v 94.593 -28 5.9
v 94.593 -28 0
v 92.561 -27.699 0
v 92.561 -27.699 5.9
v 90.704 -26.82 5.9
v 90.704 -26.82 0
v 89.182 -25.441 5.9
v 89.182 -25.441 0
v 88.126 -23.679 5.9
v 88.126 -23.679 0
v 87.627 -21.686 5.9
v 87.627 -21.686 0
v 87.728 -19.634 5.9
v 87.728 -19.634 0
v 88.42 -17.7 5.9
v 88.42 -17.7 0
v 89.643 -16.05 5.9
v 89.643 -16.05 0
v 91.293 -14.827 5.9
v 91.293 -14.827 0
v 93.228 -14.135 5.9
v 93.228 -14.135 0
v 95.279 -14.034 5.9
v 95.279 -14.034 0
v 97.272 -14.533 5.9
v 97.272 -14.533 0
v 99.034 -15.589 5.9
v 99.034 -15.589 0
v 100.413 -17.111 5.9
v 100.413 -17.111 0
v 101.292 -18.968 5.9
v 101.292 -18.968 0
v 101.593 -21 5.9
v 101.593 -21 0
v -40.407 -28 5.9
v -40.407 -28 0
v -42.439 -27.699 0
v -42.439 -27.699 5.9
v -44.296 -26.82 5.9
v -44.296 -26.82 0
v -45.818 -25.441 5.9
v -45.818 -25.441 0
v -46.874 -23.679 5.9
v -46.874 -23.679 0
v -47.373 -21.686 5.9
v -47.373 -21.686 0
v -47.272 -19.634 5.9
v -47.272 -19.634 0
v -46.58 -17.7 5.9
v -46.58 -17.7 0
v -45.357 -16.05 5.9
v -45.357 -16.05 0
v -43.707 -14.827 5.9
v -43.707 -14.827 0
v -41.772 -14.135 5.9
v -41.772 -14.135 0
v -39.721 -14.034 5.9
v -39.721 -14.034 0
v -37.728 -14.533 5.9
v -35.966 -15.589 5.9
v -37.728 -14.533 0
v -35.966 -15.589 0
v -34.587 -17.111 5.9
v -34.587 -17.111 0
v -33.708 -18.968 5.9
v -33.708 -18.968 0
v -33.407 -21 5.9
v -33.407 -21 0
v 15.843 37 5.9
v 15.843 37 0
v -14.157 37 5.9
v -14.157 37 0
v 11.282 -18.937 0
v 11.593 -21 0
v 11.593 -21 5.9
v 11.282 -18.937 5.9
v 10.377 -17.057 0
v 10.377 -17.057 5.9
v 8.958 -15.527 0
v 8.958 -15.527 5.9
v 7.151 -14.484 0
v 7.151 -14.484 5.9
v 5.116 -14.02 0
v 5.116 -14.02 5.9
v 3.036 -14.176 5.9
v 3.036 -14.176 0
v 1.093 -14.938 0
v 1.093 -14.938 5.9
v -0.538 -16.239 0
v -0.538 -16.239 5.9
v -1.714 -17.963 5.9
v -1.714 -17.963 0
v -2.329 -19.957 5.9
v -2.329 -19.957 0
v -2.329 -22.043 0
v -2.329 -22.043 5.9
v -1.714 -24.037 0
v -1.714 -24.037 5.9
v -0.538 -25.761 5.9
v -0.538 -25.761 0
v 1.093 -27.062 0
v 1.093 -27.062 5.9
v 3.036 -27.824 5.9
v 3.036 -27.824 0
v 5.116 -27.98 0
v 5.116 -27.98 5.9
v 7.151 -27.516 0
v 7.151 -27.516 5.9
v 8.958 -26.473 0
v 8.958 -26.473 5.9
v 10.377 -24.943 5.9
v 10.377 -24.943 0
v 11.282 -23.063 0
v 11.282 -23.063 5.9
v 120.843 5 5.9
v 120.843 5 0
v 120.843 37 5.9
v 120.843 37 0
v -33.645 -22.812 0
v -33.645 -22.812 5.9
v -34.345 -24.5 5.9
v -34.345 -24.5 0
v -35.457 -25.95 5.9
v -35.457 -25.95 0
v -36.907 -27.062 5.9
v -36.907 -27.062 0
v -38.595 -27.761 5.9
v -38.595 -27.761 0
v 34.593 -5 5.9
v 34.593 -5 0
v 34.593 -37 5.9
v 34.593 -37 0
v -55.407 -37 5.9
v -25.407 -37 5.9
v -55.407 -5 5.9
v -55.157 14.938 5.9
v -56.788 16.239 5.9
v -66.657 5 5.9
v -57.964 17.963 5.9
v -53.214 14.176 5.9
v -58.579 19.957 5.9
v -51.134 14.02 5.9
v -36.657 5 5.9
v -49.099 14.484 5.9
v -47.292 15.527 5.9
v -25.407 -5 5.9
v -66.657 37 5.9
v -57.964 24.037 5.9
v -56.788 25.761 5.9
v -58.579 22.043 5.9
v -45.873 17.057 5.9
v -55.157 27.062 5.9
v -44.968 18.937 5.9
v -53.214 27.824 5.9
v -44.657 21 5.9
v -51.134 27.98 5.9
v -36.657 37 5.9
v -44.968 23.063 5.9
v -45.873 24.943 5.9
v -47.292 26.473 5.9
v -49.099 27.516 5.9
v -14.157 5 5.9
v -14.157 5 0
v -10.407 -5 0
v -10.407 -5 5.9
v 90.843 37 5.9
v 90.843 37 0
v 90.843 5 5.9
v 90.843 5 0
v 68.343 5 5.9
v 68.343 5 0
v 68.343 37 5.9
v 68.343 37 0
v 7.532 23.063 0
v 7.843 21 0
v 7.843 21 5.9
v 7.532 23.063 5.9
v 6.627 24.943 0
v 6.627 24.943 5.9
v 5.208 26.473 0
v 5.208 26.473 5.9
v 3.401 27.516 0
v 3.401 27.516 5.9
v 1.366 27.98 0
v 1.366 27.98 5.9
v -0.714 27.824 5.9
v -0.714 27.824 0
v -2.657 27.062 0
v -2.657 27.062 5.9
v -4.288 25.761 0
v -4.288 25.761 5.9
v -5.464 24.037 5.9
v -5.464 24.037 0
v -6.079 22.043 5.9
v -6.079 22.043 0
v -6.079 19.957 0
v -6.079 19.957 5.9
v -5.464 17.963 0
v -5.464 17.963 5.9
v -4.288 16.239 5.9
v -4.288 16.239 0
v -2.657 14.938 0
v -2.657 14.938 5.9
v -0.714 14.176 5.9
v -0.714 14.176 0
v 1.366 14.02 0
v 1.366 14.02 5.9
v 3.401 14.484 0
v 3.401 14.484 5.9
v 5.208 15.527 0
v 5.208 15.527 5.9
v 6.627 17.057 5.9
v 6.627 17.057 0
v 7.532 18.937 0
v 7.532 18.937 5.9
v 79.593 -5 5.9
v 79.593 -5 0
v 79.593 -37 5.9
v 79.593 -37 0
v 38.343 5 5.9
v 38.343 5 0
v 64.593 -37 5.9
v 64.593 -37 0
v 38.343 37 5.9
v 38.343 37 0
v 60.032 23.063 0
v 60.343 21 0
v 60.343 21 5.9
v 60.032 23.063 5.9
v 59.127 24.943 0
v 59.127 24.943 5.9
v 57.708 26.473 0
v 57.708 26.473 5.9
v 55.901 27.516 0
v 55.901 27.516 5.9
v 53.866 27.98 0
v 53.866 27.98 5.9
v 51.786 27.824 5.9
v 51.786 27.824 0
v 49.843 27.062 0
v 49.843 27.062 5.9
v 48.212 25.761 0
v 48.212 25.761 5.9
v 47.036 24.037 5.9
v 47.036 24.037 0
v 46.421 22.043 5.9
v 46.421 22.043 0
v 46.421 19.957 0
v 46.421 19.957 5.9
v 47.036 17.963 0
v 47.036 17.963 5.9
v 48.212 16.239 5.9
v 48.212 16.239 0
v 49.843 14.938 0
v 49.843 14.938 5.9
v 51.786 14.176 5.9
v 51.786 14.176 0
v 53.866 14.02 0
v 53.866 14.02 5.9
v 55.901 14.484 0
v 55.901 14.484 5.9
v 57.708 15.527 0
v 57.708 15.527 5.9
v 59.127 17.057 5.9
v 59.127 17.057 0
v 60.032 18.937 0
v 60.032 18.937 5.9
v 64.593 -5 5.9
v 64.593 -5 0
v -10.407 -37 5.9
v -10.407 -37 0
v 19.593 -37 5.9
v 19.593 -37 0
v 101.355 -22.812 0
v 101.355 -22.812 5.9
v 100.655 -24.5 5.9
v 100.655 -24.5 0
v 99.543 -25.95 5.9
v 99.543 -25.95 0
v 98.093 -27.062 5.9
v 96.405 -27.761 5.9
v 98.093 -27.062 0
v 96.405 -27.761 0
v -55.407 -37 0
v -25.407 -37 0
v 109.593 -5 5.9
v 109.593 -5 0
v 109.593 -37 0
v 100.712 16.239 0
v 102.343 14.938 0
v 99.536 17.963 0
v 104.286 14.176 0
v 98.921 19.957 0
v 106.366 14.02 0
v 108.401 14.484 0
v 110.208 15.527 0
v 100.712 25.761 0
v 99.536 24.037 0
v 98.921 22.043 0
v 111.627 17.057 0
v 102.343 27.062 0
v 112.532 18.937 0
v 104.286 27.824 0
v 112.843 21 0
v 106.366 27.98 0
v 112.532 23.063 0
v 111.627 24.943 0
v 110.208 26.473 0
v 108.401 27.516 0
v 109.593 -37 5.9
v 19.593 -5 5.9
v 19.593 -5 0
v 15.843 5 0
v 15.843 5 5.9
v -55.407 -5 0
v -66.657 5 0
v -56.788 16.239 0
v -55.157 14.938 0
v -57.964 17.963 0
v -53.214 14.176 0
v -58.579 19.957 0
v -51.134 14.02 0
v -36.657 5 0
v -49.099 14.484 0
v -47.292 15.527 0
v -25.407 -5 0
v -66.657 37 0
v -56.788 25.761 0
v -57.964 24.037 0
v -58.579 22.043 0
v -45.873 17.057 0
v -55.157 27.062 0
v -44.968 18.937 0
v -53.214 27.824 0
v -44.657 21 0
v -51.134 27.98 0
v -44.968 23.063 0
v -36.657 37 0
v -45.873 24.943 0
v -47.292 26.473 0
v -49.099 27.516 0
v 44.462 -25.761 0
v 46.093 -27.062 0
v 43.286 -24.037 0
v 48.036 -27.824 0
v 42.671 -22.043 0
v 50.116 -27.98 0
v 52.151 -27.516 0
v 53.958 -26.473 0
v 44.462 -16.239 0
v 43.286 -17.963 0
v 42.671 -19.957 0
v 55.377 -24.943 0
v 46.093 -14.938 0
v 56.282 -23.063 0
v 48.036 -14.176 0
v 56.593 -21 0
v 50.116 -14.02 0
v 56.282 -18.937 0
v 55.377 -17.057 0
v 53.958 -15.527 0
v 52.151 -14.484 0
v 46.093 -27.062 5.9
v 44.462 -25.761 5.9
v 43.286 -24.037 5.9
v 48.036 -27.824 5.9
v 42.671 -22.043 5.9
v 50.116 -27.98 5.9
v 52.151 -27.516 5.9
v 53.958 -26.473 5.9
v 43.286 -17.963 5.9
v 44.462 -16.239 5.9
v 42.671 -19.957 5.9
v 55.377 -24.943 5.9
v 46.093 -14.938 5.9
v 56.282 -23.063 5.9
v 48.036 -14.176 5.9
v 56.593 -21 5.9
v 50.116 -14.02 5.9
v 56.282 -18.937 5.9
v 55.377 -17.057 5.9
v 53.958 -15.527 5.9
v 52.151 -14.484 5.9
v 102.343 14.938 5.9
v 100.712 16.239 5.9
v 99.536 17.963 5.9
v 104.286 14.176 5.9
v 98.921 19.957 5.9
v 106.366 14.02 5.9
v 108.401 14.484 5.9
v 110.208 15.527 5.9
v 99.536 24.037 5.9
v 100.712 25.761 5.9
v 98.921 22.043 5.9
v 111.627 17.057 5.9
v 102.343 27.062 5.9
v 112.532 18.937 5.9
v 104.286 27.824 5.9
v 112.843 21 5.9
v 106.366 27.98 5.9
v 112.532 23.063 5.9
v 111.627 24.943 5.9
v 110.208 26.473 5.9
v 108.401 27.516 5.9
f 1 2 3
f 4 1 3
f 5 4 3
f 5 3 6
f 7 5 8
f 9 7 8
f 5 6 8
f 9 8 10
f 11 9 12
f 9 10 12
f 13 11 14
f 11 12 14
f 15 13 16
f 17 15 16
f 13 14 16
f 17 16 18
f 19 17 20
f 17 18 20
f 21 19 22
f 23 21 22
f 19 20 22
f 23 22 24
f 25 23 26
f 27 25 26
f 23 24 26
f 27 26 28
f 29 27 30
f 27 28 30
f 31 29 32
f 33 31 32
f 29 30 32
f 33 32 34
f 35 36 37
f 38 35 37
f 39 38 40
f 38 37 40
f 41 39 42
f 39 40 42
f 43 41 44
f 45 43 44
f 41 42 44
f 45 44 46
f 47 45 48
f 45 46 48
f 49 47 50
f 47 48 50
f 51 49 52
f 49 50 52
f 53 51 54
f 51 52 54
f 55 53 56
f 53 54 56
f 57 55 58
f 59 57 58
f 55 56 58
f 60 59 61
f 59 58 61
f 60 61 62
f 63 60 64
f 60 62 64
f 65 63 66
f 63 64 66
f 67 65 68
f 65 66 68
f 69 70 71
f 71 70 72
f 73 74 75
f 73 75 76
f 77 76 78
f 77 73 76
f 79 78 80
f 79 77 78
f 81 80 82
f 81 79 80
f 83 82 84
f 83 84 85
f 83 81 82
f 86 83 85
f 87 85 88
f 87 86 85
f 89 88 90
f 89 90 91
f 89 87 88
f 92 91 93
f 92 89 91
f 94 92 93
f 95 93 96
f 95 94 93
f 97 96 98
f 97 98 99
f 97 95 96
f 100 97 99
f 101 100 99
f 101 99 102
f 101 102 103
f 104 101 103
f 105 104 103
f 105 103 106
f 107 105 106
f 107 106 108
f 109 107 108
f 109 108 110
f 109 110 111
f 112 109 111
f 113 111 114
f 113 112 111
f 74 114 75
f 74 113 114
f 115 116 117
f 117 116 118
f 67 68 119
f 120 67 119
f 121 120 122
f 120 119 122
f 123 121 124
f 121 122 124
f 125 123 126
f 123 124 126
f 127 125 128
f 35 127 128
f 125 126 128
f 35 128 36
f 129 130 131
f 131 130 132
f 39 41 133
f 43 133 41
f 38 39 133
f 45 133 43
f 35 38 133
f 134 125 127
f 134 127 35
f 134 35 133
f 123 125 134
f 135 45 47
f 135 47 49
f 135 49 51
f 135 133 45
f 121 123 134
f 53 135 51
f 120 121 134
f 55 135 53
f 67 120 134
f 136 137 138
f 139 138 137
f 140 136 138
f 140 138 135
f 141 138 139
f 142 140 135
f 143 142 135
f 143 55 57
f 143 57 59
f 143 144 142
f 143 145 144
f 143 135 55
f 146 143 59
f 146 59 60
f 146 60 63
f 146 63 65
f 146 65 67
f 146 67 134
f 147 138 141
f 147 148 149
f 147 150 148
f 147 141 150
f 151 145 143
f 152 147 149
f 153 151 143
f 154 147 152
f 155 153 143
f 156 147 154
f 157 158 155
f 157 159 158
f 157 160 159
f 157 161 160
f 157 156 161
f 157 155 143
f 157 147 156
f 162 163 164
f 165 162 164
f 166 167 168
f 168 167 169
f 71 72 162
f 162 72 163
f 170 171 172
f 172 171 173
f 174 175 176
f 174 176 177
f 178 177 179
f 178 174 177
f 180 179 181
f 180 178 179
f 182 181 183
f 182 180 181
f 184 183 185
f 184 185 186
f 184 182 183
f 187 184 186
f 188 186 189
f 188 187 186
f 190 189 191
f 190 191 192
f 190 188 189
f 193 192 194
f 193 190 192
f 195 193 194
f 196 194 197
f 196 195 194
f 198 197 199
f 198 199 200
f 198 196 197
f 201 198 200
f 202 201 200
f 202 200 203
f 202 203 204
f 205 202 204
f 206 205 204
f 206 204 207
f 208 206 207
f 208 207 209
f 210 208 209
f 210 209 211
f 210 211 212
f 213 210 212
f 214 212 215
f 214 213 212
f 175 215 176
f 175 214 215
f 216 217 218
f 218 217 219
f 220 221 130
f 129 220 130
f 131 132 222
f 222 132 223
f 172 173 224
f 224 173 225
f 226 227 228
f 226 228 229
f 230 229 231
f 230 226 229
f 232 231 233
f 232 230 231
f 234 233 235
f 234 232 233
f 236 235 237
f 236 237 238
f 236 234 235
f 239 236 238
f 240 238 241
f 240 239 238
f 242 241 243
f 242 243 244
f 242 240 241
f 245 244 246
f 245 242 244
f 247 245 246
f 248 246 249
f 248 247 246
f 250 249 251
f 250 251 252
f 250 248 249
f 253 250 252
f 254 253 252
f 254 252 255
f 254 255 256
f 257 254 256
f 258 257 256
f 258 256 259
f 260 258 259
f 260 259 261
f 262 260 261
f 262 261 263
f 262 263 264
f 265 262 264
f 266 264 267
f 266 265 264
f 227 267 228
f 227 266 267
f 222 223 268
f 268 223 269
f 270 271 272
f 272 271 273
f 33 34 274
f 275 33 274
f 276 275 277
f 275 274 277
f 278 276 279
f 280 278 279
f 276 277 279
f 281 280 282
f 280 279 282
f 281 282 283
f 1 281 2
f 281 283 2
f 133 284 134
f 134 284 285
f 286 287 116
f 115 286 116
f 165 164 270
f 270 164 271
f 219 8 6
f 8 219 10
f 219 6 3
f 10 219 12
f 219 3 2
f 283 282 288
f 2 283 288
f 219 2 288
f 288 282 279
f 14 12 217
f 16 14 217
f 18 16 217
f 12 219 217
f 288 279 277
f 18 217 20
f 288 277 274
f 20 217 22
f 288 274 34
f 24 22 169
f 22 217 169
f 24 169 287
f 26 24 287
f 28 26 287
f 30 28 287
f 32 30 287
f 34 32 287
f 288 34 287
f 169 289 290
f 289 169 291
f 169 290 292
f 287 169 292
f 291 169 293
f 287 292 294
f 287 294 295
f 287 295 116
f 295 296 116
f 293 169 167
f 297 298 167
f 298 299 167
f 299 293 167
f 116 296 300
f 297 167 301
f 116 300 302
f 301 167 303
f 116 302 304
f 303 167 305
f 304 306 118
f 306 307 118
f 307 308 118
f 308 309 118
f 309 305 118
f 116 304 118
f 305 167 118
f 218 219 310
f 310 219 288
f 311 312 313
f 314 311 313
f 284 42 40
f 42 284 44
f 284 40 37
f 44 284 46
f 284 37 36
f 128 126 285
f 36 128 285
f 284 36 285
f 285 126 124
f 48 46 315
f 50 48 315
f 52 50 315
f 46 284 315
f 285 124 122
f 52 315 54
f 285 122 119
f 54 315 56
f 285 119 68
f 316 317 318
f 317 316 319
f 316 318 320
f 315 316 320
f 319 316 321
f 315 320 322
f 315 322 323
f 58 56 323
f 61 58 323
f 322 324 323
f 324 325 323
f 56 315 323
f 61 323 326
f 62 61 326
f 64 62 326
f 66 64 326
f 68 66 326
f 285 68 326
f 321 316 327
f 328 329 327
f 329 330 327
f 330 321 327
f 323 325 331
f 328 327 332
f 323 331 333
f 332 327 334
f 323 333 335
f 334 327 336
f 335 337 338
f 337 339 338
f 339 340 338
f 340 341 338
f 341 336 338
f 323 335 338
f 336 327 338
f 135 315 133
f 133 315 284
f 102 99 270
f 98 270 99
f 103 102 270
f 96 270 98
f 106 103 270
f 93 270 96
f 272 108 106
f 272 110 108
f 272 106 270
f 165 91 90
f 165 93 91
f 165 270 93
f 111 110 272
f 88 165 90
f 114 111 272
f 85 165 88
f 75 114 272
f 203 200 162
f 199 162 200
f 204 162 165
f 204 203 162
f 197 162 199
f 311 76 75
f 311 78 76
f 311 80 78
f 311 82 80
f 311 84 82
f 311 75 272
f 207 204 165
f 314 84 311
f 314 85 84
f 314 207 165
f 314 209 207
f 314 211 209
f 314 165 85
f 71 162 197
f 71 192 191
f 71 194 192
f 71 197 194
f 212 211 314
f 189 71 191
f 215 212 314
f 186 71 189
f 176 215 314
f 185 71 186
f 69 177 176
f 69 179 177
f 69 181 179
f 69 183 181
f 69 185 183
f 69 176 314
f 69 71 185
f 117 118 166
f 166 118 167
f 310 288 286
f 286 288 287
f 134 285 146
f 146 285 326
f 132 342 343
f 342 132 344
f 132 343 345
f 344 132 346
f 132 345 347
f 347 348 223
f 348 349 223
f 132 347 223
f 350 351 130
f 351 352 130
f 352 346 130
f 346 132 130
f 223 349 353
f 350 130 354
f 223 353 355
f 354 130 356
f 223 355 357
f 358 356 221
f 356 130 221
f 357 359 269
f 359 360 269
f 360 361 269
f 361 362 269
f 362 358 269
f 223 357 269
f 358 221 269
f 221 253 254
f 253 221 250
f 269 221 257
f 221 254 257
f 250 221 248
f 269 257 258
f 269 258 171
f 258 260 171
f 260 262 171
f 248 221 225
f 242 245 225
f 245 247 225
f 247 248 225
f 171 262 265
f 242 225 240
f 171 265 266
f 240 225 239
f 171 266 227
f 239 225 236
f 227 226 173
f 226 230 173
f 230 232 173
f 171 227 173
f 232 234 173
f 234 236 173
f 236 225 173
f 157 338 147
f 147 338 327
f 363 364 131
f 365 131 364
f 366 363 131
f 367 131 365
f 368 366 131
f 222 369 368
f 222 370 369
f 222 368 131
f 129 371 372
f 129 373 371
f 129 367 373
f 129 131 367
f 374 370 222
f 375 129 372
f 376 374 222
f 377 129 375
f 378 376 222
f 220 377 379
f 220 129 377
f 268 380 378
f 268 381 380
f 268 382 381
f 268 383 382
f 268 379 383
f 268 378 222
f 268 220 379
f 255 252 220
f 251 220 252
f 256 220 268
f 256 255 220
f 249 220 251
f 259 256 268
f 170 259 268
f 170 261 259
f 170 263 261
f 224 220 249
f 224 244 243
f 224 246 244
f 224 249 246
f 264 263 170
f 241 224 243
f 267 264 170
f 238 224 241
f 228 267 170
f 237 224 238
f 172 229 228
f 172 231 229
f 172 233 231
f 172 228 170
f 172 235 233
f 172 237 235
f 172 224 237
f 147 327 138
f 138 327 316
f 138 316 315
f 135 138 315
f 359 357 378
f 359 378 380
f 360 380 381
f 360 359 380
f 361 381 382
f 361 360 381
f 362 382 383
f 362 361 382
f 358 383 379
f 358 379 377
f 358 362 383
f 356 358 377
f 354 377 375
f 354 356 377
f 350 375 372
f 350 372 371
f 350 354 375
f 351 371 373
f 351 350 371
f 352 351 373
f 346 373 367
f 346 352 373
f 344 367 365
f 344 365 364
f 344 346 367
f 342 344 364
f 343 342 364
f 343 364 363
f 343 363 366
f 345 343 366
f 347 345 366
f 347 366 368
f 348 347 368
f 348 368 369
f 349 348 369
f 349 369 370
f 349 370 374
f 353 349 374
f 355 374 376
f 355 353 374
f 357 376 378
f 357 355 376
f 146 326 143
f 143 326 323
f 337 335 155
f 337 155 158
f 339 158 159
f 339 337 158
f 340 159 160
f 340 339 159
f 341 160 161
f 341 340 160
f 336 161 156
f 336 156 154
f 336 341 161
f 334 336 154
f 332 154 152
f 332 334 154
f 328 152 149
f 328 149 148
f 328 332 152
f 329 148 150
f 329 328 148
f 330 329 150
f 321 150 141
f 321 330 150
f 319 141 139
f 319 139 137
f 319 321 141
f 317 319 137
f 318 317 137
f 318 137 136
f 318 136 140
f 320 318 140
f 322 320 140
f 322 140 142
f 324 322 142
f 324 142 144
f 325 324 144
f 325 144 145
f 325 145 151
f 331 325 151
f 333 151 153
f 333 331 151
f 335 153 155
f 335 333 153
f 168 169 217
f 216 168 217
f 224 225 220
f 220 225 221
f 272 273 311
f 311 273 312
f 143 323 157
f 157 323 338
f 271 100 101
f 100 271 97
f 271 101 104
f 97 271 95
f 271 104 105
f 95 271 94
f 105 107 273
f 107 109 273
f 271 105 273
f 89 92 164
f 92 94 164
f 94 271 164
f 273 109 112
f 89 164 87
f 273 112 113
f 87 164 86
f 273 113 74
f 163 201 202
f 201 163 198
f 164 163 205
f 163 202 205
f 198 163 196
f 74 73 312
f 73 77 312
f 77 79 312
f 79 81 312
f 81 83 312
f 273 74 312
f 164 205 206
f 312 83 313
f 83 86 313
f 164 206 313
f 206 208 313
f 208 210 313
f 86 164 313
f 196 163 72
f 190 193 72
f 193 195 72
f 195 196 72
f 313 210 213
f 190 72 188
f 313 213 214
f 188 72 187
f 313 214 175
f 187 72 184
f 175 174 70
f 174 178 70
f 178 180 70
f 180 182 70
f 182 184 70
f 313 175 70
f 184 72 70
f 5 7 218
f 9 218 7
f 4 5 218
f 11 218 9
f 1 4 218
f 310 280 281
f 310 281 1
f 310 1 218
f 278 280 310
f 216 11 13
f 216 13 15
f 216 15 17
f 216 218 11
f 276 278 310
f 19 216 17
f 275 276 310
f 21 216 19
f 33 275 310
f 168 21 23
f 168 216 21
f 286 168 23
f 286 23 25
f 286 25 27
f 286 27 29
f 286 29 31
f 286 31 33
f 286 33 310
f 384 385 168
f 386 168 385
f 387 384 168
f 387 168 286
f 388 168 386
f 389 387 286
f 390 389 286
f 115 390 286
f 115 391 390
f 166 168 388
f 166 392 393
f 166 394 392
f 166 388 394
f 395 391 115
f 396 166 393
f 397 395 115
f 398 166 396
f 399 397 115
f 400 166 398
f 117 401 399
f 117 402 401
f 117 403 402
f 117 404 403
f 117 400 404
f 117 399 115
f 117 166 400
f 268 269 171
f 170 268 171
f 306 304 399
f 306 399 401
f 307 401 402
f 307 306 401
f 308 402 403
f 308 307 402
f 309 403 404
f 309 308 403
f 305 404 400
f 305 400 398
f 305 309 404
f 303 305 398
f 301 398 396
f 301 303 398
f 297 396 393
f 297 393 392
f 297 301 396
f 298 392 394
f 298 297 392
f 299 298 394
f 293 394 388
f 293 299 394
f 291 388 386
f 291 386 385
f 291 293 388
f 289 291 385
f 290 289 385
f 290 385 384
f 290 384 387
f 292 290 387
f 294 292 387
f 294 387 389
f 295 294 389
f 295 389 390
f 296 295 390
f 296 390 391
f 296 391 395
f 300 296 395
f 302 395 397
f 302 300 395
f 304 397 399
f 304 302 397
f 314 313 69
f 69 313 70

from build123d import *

# Parameters (mm, degrees)
F0_R     = 7
F1_DEPTH = 5.9


# Not quite as in the source:
# - a feature names something its author has since deleted; it is built from what else it names


with BuildPart() as f1:
    # F0 (on Top) → F1 (new body)
    with BuildSketch(Plane.XY):
        Polygon((-36.6568425298, 5), (-36.6568425298, 37), (-66.6568425298, 37), (-66.6568425298, 5), (-55.4068425298, -5), (-55.4068425298, -37), (-40.4068425298, -37), (-25.4068425298, -37), (-25.4068425298, -5), align=None)
        with BuildLine():
            ThreePointArc((-33.4068425298, -21), (-35.4570950615, -25.9497474683), (-40.4068425298, -28))
            ThreePointArc((-40.4068425298, -28), (-45.3565899981, -16.0502525317), (-33.4068425298, -21))
        make_face(mode=Mode.SUBTRACT)
        with Locations((-51.6568425298, 21)):
            Circle(F0_R, mode=Mode.SUBTRACT)
    extrude(amount=F1_DEPTH)


with BuildPart() as f1b:
    # F0 (on Top) → F1, piece 2 (new body)
    with BuildSketch(Plane.XY):
        Polygon((15.8431574702, 5), (15.8431574702, 37), (-14.1568425298, 37), (-14.1568425298, 5), (-10.4068425298, -5), (-10.4068425298, -37), (19.5931574702, -37), (19.5931574702, -5), align=None)
        with Locations((4.5931574702, -21)):
            Circle(F0_R, mode=Mode.SUBTRACT)
        with Locations((0.8431574702, 21)):
            Circle(F0_R, mode=Mode.SUBTRACT)
    extrude(amount=F1_DEPTH)


with BuildPart() as f1c:
    # F0 (on Top) → F1, piece 3 (new body)
    with BuildSketch(Plane.XY):
        Polygon((34.5931574702, -5), (34.5931574702, -37), (64.5931574702, -37), (64.5931574702, -5), (68.3431574702, 5), (68.3431574702, 37), (38.3431574702, 37), (38.3431574702, 5), align=None)
        with Locations((49.5931574702, -21)):
            Circle(F0_R, mode=Mode.SUBTRACT)
        with Locations((53.3431574702, 21)):
            Circle(F0_R, mode=Mode.SUBTRACT)
    extrude(amount=F1_DEPTH)


with BuildPart() as f1d:
    # F0 (on Top) → F1, piece 4 (new body)
    with BuildSketch(Plane.XY):
        Polygon((120.8431574702, 37), (90.8431574702, 37), (90.8431574702, 5), (79.5931574702, -5), (79.5931574702, -37), (94.5931574702, -37), (109.5931574702, -37), (109.5931574702, -5), (120.8431574702, 5), align=None)
        with BuildLine():
            ThreePointArc((101.5931574702, -21), (99.5429049385, -25.9497474683), (94.5931574702, -28))
            ThreePointArc((94.5931574702, -28), (89.6434100019, -16.0502525317), (101.5931574702, -21))
        make_face(mode=Mode.SUBTRACT)
        with Locations((105.8431574702, 21)):
            Circle(F0_R, mode=Mode.SUBTRACT)
    extrude(amount=F1_DEPTH)


solid = Compound([f1.part, f1b.part, f1c.part, f1d.part])
